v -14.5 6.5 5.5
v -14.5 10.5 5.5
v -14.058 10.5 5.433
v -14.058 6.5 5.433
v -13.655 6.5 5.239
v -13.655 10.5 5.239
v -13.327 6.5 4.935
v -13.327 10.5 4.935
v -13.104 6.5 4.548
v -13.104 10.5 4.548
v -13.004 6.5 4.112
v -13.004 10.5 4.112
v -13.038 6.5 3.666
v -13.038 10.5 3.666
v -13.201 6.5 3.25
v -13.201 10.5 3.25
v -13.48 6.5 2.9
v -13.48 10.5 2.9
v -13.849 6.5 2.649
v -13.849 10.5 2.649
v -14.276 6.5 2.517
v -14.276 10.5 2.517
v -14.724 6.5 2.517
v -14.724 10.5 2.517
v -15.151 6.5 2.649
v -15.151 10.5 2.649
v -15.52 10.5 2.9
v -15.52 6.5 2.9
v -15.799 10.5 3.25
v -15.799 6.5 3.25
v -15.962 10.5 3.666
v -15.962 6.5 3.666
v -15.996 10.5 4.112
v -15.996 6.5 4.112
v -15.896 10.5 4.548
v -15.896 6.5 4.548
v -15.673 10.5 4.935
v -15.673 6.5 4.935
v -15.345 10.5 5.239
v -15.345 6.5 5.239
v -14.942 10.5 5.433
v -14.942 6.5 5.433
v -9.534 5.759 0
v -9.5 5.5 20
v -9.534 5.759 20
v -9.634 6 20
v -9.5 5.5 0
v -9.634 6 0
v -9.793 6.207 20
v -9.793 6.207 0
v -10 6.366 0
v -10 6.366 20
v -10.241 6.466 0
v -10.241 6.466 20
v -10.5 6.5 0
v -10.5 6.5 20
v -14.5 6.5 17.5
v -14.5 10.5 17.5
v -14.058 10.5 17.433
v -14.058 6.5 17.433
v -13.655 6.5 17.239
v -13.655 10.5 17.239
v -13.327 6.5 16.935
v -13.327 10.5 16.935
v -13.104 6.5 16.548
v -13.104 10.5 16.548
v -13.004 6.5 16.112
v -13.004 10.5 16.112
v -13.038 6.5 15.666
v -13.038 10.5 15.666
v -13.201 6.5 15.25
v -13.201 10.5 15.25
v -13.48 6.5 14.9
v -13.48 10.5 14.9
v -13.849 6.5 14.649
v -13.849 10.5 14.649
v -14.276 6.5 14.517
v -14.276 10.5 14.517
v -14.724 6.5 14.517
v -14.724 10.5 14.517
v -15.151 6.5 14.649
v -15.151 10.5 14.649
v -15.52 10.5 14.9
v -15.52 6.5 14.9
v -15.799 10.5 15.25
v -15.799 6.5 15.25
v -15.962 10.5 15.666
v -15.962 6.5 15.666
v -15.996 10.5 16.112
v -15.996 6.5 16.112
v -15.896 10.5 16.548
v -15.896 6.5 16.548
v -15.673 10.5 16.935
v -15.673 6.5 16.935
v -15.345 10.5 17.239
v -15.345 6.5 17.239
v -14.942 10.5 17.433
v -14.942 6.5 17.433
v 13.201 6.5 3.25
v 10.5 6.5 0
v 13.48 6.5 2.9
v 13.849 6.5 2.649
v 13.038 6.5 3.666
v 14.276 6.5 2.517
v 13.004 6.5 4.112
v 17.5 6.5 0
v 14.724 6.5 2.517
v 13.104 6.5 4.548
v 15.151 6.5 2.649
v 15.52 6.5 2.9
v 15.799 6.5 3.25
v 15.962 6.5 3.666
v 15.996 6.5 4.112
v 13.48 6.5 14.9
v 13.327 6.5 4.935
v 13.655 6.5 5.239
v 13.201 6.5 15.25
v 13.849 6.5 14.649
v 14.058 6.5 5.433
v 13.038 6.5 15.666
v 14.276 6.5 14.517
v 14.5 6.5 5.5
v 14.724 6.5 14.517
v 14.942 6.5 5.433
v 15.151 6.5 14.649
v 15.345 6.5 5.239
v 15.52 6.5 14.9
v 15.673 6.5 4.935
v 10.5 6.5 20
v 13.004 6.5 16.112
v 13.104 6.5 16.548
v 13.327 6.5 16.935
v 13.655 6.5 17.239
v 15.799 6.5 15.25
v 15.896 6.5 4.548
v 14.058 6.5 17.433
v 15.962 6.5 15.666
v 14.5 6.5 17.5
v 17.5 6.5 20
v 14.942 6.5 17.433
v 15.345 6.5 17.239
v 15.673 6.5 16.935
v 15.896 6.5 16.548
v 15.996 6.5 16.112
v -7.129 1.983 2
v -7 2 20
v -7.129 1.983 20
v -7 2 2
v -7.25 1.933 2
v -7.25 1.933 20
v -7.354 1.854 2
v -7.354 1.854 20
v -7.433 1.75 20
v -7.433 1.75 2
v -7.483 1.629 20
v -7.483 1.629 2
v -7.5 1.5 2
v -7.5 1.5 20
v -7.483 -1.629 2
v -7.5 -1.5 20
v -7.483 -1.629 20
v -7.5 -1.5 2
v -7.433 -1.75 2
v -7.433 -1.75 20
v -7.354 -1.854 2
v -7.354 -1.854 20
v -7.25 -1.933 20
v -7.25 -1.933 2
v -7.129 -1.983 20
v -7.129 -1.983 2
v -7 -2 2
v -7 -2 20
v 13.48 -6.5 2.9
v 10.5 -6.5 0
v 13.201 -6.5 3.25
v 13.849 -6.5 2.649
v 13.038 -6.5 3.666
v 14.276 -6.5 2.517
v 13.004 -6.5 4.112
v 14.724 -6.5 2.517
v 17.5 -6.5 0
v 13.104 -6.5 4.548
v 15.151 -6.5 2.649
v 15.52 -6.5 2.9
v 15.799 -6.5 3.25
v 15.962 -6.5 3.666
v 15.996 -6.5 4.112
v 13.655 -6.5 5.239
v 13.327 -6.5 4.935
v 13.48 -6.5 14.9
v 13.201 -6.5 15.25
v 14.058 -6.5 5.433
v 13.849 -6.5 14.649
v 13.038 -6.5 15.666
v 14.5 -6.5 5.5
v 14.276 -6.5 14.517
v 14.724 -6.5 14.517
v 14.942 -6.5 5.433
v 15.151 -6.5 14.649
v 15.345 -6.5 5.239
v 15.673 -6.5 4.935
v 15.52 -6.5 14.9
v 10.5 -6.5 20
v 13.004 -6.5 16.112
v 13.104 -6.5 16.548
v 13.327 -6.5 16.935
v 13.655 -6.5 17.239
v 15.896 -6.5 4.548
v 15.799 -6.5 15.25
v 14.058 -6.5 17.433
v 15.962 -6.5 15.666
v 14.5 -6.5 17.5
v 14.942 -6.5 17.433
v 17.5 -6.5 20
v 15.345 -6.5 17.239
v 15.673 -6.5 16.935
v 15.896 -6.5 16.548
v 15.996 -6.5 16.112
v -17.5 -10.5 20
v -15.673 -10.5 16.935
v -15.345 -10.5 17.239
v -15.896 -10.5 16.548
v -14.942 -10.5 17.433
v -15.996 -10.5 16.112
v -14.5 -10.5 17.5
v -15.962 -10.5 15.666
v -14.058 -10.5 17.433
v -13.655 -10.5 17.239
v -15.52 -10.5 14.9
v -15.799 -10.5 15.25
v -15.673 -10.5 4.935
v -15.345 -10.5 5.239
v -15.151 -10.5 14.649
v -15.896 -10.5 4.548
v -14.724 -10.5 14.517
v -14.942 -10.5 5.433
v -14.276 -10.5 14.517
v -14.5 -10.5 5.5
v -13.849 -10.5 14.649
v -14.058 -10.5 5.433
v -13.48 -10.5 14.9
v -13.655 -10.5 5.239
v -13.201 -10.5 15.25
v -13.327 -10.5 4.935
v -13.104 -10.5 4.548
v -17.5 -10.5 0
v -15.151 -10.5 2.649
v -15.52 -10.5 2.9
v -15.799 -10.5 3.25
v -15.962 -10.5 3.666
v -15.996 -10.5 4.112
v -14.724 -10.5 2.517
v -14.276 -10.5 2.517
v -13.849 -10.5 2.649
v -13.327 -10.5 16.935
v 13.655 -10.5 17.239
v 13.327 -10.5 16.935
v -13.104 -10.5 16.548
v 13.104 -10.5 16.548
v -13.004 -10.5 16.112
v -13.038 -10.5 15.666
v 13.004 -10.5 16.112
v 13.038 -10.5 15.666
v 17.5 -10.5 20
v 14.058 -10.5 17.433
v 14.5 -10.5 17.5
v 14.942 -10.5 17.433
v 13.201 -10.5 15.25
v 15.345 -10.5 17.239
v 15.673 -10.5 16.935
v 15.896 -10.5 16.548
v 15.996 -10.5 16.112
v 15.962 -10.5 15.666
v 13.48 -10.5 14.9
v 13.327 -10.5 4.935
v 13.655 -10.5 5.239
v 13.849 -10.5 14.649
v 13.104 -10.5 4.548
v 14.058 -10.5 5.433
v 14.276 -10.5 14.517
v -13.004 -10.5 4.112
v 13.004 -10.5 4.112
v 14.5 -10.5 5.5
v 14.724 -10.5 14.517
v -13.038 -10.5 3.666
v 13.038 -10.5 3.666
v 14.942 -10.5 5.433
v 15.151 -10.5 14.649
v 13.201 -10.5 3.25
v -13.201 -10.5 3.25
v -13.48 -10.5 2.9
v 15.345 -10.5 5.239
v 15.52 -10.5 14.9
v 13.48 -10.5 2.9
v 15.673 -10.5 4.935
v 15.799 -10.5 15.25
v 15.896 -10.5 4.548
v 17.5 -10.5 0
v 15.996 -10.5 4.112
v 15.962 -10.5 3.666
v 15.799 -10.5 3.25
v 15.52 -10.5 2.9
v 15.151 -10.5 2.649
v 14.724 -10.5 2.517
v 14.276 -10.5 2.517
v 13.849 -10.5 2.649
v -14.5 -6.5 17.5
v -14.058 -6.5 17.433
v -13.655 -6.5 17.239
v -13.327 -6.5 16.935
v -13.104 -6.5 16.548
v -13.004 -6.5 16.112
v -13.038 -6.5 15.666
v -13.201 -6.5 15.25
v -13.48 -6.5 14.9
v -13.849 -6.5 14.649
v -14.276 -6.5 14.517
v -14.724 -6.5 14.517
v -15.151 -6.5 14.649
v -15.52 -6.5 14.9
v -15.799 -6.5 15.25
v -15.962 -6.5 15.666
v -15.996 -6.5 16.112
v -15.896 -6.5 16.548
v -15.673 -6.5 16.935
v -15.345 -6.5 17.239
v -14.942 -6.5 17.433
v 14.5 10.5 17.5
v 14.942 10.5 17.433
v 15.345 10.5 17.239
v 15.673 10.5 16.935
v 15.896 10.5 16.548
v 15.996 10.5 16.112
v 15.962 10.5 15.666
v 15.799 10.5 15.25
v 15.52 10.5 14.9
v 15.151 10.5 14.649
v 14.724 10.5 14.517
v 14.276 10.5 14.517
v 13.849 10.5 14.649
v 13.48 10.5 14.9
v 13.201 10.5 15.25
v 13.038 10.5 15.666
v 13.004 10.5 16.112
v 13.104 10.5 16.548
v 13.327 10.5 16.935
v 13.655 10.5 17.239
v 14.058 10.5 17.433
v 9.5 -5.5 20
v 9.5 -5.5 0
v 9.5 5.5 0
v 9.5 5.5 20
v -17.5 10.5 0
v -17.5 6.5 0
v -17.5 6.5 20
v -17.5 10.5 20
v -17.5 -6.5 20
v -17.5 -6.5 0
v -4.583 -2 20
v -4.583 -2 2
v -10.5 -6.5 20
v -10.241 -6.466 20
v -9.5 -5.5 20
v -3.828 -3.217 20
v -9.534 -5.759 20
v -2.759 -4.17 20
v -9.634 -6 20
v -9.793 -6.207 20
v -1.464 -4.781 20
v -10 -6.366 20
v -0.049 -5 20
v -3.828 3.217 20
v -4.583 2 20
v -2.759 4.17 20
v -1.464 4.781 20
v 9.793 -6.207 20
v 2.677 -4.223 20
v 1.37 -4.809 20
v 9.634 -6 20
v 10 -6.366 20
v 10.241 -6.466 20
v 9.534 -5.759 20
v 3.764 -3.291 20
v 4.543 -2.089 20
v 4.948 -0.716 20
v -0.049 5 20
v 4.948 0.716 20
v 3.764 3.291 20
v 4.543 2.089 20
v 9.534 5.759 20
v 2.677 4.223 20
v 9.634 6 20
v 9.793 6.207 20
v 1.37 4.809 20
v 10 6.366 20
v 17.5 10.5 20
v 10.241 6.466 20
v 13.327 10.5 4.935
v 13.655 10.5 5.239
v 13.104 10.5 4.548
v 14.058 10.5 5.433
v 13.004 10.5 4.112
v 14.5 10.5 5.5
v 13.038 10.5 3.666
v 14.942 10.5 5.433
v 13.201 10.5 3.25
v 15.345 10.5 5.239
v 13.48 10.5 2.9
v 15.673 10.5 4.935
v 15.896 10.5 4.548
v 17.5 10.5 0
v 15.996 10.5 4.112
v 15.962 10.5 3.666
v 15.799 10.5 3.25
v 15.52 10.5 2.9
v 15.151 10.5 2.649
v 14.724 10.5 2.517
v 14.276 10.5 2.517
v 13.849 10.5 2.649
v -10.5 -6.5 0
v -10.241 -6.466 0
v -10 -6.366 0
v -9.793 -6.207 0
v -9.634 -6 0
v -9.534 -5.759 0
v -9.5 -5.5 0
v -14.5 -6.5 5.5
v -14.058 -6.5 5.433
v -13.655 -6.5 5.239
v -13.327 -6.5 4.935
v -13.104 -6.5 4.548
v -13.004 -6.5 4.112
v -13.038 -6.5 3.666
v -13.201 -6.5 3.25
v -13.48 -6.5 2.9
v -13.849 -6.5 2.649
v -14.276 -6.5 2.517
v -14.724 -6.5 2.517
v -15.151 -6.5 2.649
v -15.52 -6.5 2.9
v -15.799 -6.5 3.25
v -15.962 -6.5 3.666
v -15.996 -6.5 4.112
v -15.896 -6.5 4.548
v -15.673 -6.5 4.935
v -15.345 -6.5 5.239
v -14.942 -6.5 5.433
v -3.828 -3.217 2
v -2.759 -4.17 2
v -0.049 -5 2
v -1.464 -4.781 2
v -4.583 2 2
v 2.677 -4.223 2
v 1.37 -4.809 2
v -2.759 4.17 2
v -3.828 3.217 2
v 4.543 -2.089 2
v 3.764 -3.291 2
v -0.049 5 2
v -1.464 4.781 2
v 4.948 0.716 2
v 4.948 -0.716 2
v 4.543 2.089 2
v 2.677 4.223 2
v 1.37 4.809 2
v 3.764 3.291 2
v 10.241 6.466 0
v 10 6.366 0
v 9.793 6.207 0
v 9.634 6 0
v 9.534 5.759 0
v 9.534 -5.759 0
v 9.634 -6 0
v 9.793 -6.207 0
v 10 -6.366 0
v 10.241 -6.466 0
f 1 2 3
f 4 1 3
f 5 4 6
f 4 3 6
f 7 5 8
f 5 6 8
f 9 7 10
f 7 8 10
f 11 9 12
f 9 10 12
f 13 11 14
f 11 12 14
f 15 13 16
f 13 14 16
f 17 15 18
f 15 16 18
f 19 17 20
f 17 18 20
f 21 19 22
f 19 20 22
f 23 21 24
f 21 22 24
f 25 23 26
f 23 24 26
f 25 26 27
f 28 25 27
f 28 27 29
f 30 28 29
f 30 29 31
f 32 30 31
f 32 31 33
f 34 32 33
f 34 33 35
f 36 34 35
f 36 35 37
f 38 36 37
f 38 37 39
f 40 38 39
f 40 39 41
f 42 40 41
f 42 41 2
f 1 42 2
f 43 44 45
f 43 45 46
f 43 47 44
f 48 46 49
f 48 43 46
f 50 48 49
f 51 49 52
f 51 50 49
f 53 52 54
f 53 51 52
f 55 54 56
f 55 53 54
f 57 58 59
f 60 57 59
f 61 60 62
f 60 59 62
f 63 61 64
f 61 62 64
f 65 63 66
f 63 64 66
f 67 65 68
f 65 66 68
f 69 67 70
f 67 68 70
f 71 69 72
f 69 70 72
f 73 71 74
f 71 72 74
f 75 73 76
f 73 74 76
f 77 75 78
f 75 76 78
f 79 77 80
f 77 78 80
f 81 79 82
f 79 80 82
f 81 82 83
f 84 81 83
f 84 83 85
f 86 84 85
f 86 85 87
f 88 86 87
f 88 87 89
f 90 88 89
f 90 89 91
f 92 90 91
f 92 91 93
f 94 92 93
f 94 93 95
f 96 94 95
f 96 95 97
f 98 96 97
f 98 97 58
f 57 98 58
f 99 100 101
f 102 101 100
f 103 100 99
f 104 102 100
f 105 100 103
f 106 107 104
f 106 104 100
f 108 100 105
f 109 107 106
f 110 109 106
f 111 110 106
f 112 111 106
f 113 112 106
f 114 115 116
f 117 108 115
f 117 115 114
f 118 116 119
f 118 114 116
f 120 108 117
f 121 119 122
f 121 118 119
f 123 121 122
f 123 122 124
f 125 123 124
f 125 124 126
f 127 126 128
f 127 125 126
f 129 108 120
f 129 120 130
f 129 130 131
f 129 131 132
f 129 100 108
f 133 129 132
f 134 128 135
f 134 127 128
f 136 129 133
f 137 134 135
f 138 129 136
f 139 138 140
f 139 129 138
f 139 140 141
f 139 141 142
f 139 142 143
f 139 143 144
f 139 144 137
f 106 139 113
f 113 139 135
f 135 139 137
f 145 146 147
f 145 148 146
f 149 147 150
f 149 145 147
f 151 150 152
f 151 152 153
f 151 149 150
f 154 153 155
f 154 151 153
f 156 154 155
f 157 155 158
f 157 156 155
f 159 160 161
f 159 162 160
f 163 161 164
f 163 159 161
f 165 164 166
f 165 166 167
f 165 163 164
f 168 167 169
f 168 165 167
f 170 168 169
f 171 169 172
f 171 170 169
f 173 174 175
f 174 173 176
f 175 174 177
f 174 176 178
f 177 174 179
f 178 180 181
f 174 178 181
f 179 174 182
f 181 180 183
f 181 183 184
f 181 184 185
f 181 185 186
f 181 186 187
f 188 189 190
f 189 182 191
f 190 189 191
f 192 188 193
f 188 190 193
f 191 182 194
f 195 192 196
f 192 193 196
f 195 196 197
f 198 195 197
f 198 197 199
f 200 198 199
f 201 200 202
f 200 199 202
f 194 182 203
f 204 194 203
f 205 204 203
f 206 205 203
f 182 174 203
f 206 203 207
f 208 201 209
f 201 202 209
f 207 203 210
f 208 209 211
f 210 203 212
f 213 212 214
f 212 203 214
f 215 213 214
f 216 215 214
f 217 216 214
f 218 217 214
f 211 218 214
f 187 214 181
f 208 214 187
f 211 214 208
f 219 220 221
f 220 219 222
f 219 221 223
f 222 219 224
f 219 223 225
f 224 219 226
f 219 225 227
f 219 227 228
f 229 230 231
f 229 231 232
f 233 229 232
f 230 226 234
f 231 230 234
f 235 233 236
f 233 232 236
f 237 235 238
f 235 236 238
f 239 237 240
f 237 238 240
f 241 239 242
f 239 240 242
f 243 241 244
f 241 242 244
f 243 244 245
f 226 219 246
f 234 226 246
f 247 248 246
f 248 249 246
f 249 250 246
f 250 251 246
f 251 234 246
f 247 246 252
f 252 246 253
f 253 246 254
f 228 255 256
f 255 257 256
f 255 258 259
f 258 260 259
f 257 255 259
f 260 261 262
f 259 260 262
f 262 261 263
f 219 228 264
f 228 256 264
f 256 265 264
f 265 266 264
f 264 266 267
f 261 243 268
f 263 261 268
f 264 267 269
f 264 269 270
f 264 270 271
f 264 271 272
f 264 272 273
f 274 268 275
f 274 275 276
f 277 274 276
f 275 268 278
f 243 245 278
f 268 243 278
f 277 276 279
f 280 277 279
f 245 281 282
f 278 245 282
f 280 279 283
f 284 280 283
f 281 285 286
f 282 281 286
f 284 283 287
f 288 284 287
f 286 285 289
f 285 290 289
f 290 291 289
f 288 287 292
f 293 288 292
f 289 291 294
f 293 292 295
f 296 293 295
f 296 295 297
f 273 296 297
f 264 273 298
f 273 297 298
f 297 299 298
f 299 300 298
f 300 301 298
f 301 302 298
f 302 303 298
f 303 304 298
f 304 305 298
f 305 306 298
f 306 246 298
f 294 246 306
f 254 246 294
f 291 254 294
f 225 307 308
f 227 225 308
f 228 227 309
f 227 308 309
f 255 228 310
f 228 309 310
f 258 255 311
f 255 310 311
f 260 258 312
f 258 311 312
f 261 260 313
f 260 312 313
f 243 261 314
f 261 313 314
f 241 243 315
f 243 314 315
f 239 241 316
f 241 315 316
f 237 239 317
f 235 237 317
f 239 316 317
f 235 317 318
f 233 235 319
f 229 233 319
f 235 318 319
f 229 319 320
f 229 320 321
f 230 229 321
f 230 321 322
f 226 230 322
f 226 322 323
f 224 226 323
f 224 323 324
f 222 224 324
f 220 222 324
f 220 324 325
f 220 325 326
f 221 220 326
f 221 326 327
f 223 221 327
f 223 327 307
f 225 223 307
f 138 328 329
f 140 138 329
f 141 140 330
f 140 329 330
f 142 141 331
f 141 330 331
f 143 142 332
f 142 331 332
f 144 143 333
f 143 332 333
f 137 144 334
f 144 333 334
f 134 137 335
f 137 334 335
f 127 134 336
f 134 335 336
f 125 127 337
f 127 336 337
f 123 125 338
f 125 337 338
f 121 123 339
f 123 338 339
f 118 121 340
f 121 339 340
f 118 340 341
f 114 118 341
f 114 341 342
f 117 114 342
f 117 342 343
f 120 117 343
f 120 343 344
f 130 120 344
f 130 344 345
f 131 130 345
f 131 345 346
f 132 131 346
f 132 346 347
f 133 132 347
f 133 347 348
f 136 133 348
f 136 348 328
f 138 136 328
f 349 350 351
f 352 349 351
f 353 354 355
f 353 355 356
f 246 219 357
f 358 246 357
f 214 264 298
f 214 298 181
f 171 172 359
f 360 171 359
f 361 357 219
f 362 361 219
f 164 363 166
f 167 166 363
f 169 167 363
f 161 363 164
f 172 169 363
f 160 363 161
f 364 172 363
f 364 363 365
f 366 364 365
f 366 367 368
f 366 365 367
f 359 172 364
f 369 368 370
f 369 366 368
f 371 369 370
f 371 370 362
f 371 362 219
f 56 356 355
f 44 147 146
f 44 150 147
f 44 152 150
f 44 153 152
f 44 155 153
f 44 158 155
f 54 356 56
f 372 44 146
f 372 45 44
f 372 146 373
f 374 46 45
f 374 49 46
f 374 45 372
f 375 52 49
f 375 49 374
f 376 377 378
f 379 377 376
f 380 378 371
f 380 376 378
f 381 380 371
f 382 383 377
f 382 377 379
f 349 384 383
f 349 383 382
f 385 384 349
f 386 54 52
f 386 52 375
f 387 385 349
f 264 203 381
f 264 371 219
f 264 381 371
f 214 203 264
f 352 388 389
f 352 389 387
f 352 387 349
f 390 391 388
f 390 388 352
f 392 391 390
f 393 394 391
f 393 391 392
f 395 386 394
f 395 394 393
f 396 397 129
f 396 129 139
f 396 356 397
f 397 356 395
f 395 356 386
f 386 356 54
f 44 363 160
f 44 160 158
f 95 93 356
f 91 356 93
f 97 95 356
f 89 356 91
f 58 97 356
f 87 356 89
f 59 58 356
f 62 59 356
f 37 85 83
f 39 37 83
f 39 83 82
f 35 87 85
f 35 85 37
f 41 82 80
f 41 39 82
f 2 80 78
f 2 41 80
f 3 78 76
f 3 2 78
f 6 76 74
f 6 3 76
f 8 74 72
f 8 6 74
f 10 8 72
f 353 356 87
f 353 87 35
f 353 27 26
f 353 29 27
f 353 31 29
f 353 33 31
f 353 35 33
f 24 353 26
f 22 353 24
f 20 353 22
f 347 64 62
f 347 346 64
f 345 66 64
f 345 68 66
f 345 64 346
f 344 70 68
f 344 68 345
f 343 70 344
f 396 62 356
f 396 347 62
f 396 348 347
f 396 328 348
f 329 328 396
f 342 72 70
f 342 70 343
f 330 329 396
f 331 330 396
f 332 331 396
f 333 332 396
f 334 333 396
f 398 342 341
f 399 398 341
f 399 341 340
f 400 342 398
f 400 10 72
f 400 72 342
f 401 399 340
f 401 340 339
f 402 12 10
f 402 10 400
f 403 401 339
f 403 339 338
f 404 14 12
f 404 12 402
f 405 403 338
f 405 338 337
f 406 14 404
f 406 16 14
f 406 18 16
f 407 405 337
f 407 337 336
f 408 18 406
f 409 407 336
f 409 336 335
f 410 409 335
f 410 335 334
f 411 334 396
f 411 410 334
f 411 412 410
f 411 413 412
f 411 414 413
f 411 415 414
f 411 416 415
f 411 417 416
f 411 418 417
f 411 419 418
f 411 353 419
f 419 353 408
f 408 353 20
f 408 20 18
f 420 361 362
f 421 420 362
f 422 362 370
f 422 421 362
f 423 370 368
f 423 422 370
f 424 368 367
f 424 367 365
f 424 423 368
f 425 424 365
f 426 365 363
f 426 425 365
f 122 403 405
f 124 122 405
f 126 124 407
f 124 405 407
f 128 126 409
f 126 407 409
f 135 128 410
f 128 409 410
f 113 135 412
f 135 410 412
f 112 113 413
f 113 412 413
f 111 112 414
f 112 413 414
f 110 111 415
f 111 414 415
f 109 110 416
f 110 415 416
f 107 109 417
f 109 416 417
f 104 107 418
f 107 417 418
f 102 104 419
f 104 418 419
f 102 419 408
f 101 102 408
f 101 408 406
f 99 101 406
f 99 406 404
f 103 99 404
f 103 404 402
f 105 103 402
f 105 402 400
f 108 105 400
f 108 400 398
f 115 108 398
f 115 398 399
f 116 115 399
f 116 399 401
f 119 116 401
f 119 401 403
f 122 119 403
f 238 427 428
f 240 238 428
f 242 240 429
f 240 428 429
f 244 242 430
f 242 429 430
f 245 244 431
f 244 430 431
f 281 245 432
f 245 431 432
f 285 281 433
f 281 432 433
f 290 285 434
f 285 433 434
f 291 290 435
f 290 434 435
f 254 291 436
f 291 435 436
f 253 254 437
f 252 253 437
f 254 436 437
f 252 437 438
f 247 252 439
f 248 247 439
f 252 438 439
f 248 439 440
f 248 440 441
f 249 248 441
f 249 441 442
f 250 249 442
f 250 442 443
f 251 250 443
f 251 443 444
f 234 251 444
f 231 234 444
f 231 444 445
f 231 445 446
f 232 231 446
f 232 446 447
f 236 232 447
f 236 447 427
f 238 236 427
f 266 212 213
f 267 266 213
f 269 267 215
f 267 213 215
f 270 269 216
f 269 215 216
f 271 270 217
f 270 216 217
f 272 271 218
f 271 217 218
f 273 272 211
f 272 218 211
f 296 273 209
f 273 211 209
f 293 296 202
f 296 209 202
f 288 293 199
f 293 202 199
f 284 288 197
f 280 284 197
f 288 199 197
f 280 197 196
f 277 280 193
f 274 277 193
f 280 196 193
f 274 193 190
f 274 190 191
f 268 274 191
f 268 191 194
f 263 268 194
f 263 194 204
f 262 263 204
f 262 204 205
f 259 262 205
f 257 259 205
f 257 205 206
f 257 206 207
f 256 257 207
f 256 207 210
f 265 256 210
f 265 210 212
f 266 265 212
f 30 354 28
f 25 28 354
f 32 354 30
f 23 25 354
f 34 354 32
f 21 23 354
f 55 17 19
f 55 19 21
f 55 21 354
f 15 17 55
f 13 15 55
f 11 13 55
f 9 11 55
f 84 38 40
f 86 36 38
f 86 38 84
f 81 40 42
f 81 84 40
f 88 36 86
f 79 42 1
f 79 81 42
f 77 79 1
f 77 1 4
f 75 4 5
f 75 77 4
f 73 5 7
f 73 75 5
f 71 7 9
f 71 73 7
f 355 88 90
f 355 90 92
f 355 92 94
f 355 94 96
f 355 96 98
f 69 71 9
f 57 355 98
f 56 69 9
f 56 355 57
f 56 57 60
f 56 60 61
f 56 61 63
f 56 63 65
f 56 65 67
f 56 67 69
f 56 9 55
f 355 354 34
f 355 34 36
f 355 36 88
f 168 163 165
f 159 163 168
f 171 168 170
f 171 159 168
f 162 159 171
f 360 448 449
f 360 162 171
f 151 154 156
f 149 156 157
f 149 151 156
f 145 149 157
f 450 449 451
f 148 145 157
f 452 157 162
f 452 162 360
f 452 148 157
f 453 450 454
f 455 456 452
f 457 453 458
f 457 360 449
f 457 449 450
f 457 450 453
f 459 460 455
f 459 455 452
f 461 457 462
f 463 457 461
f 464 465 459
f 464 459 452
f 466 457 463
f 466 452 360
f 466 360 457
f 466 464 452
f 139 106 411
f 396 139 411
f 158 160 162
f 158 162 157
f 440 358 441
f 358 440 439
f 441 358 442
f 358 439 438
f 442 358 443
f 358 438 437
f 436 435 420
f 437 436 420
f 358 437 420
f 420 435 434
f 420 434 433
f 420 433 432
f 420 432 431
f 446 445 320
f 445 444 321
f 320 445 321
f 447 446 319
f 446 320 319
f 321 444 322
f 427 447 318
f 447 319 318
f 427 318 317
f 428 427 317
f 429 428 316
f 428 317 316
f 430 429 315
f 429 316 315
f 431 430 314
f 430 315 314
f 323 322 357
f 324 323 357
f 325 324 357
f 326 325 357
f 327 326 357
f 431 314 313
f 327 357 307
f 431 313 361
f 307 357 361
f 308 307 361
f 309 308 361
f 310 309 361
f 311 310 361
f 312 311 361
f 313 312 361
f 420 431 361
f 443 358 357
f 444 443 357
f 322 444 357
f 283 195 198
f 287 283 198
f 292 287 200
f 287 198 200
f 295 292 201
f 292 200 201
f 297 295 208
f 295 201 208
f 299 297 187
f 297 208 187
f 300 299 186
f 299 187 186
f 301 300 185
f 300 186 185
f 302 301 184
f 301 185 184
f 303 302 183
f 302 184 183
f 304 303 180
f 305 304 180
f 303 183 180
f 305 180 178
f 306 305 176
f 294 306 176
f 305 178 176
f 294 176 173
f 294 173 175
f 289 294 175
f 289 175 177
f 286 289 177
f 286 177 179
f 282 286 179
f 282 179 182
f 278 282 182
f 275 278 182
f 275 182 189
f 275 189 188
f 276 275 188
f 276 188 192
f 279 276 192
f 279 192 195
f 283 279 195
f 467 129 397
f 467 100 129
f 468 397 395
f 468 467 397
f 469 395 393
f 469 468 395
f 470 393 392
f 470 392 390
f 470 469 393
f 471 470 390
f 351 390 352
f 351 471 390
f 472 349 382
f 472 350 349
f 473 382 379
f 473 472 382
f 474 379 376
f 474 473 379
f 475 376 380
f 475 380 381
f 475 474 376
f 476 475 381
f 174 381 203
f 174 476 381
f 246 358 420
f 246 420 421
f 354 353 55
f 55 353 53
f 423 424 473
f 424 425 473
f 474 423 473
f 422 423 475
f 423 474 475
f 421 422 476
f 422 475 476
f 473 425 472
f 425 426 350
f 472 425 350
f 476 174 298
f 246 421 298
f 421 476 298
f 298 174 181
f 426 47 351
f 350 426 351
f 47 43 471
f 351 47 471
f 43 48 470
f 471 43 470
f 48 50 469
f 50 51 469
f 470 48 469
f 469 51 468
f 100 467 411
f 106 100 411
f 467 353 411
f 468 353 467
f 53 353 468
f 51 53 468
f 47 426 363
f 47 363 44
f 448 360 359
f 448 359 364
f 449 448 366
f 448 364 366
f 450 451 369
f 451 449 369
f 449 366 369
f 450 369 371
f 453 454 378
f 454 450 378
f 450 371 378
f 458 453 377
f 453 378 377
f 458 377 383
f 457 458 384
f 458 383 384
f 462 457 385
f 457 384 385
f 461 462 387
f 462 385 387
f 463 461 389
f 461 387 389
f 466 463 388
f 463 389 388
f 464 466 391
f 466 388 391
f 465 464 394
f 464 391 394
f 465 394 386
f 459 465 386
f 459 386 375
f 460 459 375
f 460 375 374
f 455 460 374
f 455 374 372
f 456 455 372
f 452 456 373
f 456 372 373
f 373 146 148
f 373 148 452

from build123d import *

# Parameters (mm, degrees)
SKETCH_1_W          = 35
SKETCH_1_H          = 21
EXTRUDE_1_DEPTH     = 20
SKETCH_2_R          = 5
CUT_EXTRUDE_1_DEPTH = 18
SKETCH_3_W          = 7.5
SKETCH_3_H          = 4
CUT_EXTRUDE_2_DEPTH = 18
FILLET_1_R          = 0.5
SKETCH_7_W          = 8
SKETCH_7_H          = 13
CUT_EXTRUDE_3_DEPTH = 29.574464124
FILLET_2_R          = 1
SKETCH_8_R          = 1.5
CUT_EXTRUDE_4_DEPTH = 34.871079109


with BuildPart() as part:
    # 草图1 → 凸台-拉伸1 (new body)
    with BuildSketch(Plane.XY):
        Rectangle(SKETCH_1_W, SKETCH_1_H)
    extrude(amount=EXTRUDE_1_DEPTH)

    # 草图2 → 切除-拉伸1 (cut)
    with BuildSketch(Plane.XY.offset(20)):
        Circle(SKETCH_2_R)
    extrude(amount=-CUT_EXTRUDE_1_DEPTH, mode=Mode.SUBTRACT)

    # 草图3 → 切除-拉伸2 (cut)
    with BuildSketch(Plane.XY.offset(20)):
        with Locations((-3.75, 0)):
            Rectangle(SKETCH_3_W, SKETCH_3_H)
    extrude(amount=-CUT_EXTRUDE_2_DEPTH, mode=Mode.SUBTRACT)

    # 圆角1
    fillet_1_edges = [part.edges().sort_by_distance(p)[0] for p in [
        (-7.5, 2, 11),
        (-7.5, -2, 11),
    ]]
    fillet(fillet_1_edges, radius=FILLET_1_R)

    # 草图7 → 切除-拉伸3 (cut, through all)
    with BuildSketch(Plane.XY.offset(20)):
        with Locations((-13.5, 0)):
            Rectangle(SKETCH_7_W, SKETCH_7_H)
        with Locations((13.5, 0)):
            Rectangle(SKETCH_7_W, SKETCH_7_H)
    extrude(amount=-CUT_EXTRUDE_3_DEPTH, mode=Mode.SUBTRACT)

    # 圆角2
    fillet_2_edges = [part.edges().sort_by_distance(p)[0] for p in [
        (-9.5, 6.5, 10),
        (-9.5, -6.5, 10),
        (9.5, 6.5, 10),
        (9.5, -6.5, 10),
    ]]
    fillet(fillet_2_edges, radius=FILLET_2_R)

    # 草图8 → 切除-拉伸4 (cut, through all)
    with BuildSketch(Plane(origin=(0, 10.5, 0), x_dir=(1, 0, 0), z_dir=(0, 1, 0))):
        with Locations(Location((-14.5, -4, 0), (0, 0, 270))):
            Circle(SKETCH_8_R)
        with Locations(Location((-14.5, -16, 0), (0, 0, 270))):
            Circle(SKETCH_8_R)
        with Locations(Location((14.5, -16, 0), (0, 0, 270))):
            Circle(SKETCH_8_R)
        with Locations(Location((14.5, -4, 0), (0, 0, 270))):
            Circle(SKETCH_8_R)
    extrude(amount=-CUT_EXTRUDE_4_DEPTH, mode=Mode.SUBTRACT)


solid = part.part
